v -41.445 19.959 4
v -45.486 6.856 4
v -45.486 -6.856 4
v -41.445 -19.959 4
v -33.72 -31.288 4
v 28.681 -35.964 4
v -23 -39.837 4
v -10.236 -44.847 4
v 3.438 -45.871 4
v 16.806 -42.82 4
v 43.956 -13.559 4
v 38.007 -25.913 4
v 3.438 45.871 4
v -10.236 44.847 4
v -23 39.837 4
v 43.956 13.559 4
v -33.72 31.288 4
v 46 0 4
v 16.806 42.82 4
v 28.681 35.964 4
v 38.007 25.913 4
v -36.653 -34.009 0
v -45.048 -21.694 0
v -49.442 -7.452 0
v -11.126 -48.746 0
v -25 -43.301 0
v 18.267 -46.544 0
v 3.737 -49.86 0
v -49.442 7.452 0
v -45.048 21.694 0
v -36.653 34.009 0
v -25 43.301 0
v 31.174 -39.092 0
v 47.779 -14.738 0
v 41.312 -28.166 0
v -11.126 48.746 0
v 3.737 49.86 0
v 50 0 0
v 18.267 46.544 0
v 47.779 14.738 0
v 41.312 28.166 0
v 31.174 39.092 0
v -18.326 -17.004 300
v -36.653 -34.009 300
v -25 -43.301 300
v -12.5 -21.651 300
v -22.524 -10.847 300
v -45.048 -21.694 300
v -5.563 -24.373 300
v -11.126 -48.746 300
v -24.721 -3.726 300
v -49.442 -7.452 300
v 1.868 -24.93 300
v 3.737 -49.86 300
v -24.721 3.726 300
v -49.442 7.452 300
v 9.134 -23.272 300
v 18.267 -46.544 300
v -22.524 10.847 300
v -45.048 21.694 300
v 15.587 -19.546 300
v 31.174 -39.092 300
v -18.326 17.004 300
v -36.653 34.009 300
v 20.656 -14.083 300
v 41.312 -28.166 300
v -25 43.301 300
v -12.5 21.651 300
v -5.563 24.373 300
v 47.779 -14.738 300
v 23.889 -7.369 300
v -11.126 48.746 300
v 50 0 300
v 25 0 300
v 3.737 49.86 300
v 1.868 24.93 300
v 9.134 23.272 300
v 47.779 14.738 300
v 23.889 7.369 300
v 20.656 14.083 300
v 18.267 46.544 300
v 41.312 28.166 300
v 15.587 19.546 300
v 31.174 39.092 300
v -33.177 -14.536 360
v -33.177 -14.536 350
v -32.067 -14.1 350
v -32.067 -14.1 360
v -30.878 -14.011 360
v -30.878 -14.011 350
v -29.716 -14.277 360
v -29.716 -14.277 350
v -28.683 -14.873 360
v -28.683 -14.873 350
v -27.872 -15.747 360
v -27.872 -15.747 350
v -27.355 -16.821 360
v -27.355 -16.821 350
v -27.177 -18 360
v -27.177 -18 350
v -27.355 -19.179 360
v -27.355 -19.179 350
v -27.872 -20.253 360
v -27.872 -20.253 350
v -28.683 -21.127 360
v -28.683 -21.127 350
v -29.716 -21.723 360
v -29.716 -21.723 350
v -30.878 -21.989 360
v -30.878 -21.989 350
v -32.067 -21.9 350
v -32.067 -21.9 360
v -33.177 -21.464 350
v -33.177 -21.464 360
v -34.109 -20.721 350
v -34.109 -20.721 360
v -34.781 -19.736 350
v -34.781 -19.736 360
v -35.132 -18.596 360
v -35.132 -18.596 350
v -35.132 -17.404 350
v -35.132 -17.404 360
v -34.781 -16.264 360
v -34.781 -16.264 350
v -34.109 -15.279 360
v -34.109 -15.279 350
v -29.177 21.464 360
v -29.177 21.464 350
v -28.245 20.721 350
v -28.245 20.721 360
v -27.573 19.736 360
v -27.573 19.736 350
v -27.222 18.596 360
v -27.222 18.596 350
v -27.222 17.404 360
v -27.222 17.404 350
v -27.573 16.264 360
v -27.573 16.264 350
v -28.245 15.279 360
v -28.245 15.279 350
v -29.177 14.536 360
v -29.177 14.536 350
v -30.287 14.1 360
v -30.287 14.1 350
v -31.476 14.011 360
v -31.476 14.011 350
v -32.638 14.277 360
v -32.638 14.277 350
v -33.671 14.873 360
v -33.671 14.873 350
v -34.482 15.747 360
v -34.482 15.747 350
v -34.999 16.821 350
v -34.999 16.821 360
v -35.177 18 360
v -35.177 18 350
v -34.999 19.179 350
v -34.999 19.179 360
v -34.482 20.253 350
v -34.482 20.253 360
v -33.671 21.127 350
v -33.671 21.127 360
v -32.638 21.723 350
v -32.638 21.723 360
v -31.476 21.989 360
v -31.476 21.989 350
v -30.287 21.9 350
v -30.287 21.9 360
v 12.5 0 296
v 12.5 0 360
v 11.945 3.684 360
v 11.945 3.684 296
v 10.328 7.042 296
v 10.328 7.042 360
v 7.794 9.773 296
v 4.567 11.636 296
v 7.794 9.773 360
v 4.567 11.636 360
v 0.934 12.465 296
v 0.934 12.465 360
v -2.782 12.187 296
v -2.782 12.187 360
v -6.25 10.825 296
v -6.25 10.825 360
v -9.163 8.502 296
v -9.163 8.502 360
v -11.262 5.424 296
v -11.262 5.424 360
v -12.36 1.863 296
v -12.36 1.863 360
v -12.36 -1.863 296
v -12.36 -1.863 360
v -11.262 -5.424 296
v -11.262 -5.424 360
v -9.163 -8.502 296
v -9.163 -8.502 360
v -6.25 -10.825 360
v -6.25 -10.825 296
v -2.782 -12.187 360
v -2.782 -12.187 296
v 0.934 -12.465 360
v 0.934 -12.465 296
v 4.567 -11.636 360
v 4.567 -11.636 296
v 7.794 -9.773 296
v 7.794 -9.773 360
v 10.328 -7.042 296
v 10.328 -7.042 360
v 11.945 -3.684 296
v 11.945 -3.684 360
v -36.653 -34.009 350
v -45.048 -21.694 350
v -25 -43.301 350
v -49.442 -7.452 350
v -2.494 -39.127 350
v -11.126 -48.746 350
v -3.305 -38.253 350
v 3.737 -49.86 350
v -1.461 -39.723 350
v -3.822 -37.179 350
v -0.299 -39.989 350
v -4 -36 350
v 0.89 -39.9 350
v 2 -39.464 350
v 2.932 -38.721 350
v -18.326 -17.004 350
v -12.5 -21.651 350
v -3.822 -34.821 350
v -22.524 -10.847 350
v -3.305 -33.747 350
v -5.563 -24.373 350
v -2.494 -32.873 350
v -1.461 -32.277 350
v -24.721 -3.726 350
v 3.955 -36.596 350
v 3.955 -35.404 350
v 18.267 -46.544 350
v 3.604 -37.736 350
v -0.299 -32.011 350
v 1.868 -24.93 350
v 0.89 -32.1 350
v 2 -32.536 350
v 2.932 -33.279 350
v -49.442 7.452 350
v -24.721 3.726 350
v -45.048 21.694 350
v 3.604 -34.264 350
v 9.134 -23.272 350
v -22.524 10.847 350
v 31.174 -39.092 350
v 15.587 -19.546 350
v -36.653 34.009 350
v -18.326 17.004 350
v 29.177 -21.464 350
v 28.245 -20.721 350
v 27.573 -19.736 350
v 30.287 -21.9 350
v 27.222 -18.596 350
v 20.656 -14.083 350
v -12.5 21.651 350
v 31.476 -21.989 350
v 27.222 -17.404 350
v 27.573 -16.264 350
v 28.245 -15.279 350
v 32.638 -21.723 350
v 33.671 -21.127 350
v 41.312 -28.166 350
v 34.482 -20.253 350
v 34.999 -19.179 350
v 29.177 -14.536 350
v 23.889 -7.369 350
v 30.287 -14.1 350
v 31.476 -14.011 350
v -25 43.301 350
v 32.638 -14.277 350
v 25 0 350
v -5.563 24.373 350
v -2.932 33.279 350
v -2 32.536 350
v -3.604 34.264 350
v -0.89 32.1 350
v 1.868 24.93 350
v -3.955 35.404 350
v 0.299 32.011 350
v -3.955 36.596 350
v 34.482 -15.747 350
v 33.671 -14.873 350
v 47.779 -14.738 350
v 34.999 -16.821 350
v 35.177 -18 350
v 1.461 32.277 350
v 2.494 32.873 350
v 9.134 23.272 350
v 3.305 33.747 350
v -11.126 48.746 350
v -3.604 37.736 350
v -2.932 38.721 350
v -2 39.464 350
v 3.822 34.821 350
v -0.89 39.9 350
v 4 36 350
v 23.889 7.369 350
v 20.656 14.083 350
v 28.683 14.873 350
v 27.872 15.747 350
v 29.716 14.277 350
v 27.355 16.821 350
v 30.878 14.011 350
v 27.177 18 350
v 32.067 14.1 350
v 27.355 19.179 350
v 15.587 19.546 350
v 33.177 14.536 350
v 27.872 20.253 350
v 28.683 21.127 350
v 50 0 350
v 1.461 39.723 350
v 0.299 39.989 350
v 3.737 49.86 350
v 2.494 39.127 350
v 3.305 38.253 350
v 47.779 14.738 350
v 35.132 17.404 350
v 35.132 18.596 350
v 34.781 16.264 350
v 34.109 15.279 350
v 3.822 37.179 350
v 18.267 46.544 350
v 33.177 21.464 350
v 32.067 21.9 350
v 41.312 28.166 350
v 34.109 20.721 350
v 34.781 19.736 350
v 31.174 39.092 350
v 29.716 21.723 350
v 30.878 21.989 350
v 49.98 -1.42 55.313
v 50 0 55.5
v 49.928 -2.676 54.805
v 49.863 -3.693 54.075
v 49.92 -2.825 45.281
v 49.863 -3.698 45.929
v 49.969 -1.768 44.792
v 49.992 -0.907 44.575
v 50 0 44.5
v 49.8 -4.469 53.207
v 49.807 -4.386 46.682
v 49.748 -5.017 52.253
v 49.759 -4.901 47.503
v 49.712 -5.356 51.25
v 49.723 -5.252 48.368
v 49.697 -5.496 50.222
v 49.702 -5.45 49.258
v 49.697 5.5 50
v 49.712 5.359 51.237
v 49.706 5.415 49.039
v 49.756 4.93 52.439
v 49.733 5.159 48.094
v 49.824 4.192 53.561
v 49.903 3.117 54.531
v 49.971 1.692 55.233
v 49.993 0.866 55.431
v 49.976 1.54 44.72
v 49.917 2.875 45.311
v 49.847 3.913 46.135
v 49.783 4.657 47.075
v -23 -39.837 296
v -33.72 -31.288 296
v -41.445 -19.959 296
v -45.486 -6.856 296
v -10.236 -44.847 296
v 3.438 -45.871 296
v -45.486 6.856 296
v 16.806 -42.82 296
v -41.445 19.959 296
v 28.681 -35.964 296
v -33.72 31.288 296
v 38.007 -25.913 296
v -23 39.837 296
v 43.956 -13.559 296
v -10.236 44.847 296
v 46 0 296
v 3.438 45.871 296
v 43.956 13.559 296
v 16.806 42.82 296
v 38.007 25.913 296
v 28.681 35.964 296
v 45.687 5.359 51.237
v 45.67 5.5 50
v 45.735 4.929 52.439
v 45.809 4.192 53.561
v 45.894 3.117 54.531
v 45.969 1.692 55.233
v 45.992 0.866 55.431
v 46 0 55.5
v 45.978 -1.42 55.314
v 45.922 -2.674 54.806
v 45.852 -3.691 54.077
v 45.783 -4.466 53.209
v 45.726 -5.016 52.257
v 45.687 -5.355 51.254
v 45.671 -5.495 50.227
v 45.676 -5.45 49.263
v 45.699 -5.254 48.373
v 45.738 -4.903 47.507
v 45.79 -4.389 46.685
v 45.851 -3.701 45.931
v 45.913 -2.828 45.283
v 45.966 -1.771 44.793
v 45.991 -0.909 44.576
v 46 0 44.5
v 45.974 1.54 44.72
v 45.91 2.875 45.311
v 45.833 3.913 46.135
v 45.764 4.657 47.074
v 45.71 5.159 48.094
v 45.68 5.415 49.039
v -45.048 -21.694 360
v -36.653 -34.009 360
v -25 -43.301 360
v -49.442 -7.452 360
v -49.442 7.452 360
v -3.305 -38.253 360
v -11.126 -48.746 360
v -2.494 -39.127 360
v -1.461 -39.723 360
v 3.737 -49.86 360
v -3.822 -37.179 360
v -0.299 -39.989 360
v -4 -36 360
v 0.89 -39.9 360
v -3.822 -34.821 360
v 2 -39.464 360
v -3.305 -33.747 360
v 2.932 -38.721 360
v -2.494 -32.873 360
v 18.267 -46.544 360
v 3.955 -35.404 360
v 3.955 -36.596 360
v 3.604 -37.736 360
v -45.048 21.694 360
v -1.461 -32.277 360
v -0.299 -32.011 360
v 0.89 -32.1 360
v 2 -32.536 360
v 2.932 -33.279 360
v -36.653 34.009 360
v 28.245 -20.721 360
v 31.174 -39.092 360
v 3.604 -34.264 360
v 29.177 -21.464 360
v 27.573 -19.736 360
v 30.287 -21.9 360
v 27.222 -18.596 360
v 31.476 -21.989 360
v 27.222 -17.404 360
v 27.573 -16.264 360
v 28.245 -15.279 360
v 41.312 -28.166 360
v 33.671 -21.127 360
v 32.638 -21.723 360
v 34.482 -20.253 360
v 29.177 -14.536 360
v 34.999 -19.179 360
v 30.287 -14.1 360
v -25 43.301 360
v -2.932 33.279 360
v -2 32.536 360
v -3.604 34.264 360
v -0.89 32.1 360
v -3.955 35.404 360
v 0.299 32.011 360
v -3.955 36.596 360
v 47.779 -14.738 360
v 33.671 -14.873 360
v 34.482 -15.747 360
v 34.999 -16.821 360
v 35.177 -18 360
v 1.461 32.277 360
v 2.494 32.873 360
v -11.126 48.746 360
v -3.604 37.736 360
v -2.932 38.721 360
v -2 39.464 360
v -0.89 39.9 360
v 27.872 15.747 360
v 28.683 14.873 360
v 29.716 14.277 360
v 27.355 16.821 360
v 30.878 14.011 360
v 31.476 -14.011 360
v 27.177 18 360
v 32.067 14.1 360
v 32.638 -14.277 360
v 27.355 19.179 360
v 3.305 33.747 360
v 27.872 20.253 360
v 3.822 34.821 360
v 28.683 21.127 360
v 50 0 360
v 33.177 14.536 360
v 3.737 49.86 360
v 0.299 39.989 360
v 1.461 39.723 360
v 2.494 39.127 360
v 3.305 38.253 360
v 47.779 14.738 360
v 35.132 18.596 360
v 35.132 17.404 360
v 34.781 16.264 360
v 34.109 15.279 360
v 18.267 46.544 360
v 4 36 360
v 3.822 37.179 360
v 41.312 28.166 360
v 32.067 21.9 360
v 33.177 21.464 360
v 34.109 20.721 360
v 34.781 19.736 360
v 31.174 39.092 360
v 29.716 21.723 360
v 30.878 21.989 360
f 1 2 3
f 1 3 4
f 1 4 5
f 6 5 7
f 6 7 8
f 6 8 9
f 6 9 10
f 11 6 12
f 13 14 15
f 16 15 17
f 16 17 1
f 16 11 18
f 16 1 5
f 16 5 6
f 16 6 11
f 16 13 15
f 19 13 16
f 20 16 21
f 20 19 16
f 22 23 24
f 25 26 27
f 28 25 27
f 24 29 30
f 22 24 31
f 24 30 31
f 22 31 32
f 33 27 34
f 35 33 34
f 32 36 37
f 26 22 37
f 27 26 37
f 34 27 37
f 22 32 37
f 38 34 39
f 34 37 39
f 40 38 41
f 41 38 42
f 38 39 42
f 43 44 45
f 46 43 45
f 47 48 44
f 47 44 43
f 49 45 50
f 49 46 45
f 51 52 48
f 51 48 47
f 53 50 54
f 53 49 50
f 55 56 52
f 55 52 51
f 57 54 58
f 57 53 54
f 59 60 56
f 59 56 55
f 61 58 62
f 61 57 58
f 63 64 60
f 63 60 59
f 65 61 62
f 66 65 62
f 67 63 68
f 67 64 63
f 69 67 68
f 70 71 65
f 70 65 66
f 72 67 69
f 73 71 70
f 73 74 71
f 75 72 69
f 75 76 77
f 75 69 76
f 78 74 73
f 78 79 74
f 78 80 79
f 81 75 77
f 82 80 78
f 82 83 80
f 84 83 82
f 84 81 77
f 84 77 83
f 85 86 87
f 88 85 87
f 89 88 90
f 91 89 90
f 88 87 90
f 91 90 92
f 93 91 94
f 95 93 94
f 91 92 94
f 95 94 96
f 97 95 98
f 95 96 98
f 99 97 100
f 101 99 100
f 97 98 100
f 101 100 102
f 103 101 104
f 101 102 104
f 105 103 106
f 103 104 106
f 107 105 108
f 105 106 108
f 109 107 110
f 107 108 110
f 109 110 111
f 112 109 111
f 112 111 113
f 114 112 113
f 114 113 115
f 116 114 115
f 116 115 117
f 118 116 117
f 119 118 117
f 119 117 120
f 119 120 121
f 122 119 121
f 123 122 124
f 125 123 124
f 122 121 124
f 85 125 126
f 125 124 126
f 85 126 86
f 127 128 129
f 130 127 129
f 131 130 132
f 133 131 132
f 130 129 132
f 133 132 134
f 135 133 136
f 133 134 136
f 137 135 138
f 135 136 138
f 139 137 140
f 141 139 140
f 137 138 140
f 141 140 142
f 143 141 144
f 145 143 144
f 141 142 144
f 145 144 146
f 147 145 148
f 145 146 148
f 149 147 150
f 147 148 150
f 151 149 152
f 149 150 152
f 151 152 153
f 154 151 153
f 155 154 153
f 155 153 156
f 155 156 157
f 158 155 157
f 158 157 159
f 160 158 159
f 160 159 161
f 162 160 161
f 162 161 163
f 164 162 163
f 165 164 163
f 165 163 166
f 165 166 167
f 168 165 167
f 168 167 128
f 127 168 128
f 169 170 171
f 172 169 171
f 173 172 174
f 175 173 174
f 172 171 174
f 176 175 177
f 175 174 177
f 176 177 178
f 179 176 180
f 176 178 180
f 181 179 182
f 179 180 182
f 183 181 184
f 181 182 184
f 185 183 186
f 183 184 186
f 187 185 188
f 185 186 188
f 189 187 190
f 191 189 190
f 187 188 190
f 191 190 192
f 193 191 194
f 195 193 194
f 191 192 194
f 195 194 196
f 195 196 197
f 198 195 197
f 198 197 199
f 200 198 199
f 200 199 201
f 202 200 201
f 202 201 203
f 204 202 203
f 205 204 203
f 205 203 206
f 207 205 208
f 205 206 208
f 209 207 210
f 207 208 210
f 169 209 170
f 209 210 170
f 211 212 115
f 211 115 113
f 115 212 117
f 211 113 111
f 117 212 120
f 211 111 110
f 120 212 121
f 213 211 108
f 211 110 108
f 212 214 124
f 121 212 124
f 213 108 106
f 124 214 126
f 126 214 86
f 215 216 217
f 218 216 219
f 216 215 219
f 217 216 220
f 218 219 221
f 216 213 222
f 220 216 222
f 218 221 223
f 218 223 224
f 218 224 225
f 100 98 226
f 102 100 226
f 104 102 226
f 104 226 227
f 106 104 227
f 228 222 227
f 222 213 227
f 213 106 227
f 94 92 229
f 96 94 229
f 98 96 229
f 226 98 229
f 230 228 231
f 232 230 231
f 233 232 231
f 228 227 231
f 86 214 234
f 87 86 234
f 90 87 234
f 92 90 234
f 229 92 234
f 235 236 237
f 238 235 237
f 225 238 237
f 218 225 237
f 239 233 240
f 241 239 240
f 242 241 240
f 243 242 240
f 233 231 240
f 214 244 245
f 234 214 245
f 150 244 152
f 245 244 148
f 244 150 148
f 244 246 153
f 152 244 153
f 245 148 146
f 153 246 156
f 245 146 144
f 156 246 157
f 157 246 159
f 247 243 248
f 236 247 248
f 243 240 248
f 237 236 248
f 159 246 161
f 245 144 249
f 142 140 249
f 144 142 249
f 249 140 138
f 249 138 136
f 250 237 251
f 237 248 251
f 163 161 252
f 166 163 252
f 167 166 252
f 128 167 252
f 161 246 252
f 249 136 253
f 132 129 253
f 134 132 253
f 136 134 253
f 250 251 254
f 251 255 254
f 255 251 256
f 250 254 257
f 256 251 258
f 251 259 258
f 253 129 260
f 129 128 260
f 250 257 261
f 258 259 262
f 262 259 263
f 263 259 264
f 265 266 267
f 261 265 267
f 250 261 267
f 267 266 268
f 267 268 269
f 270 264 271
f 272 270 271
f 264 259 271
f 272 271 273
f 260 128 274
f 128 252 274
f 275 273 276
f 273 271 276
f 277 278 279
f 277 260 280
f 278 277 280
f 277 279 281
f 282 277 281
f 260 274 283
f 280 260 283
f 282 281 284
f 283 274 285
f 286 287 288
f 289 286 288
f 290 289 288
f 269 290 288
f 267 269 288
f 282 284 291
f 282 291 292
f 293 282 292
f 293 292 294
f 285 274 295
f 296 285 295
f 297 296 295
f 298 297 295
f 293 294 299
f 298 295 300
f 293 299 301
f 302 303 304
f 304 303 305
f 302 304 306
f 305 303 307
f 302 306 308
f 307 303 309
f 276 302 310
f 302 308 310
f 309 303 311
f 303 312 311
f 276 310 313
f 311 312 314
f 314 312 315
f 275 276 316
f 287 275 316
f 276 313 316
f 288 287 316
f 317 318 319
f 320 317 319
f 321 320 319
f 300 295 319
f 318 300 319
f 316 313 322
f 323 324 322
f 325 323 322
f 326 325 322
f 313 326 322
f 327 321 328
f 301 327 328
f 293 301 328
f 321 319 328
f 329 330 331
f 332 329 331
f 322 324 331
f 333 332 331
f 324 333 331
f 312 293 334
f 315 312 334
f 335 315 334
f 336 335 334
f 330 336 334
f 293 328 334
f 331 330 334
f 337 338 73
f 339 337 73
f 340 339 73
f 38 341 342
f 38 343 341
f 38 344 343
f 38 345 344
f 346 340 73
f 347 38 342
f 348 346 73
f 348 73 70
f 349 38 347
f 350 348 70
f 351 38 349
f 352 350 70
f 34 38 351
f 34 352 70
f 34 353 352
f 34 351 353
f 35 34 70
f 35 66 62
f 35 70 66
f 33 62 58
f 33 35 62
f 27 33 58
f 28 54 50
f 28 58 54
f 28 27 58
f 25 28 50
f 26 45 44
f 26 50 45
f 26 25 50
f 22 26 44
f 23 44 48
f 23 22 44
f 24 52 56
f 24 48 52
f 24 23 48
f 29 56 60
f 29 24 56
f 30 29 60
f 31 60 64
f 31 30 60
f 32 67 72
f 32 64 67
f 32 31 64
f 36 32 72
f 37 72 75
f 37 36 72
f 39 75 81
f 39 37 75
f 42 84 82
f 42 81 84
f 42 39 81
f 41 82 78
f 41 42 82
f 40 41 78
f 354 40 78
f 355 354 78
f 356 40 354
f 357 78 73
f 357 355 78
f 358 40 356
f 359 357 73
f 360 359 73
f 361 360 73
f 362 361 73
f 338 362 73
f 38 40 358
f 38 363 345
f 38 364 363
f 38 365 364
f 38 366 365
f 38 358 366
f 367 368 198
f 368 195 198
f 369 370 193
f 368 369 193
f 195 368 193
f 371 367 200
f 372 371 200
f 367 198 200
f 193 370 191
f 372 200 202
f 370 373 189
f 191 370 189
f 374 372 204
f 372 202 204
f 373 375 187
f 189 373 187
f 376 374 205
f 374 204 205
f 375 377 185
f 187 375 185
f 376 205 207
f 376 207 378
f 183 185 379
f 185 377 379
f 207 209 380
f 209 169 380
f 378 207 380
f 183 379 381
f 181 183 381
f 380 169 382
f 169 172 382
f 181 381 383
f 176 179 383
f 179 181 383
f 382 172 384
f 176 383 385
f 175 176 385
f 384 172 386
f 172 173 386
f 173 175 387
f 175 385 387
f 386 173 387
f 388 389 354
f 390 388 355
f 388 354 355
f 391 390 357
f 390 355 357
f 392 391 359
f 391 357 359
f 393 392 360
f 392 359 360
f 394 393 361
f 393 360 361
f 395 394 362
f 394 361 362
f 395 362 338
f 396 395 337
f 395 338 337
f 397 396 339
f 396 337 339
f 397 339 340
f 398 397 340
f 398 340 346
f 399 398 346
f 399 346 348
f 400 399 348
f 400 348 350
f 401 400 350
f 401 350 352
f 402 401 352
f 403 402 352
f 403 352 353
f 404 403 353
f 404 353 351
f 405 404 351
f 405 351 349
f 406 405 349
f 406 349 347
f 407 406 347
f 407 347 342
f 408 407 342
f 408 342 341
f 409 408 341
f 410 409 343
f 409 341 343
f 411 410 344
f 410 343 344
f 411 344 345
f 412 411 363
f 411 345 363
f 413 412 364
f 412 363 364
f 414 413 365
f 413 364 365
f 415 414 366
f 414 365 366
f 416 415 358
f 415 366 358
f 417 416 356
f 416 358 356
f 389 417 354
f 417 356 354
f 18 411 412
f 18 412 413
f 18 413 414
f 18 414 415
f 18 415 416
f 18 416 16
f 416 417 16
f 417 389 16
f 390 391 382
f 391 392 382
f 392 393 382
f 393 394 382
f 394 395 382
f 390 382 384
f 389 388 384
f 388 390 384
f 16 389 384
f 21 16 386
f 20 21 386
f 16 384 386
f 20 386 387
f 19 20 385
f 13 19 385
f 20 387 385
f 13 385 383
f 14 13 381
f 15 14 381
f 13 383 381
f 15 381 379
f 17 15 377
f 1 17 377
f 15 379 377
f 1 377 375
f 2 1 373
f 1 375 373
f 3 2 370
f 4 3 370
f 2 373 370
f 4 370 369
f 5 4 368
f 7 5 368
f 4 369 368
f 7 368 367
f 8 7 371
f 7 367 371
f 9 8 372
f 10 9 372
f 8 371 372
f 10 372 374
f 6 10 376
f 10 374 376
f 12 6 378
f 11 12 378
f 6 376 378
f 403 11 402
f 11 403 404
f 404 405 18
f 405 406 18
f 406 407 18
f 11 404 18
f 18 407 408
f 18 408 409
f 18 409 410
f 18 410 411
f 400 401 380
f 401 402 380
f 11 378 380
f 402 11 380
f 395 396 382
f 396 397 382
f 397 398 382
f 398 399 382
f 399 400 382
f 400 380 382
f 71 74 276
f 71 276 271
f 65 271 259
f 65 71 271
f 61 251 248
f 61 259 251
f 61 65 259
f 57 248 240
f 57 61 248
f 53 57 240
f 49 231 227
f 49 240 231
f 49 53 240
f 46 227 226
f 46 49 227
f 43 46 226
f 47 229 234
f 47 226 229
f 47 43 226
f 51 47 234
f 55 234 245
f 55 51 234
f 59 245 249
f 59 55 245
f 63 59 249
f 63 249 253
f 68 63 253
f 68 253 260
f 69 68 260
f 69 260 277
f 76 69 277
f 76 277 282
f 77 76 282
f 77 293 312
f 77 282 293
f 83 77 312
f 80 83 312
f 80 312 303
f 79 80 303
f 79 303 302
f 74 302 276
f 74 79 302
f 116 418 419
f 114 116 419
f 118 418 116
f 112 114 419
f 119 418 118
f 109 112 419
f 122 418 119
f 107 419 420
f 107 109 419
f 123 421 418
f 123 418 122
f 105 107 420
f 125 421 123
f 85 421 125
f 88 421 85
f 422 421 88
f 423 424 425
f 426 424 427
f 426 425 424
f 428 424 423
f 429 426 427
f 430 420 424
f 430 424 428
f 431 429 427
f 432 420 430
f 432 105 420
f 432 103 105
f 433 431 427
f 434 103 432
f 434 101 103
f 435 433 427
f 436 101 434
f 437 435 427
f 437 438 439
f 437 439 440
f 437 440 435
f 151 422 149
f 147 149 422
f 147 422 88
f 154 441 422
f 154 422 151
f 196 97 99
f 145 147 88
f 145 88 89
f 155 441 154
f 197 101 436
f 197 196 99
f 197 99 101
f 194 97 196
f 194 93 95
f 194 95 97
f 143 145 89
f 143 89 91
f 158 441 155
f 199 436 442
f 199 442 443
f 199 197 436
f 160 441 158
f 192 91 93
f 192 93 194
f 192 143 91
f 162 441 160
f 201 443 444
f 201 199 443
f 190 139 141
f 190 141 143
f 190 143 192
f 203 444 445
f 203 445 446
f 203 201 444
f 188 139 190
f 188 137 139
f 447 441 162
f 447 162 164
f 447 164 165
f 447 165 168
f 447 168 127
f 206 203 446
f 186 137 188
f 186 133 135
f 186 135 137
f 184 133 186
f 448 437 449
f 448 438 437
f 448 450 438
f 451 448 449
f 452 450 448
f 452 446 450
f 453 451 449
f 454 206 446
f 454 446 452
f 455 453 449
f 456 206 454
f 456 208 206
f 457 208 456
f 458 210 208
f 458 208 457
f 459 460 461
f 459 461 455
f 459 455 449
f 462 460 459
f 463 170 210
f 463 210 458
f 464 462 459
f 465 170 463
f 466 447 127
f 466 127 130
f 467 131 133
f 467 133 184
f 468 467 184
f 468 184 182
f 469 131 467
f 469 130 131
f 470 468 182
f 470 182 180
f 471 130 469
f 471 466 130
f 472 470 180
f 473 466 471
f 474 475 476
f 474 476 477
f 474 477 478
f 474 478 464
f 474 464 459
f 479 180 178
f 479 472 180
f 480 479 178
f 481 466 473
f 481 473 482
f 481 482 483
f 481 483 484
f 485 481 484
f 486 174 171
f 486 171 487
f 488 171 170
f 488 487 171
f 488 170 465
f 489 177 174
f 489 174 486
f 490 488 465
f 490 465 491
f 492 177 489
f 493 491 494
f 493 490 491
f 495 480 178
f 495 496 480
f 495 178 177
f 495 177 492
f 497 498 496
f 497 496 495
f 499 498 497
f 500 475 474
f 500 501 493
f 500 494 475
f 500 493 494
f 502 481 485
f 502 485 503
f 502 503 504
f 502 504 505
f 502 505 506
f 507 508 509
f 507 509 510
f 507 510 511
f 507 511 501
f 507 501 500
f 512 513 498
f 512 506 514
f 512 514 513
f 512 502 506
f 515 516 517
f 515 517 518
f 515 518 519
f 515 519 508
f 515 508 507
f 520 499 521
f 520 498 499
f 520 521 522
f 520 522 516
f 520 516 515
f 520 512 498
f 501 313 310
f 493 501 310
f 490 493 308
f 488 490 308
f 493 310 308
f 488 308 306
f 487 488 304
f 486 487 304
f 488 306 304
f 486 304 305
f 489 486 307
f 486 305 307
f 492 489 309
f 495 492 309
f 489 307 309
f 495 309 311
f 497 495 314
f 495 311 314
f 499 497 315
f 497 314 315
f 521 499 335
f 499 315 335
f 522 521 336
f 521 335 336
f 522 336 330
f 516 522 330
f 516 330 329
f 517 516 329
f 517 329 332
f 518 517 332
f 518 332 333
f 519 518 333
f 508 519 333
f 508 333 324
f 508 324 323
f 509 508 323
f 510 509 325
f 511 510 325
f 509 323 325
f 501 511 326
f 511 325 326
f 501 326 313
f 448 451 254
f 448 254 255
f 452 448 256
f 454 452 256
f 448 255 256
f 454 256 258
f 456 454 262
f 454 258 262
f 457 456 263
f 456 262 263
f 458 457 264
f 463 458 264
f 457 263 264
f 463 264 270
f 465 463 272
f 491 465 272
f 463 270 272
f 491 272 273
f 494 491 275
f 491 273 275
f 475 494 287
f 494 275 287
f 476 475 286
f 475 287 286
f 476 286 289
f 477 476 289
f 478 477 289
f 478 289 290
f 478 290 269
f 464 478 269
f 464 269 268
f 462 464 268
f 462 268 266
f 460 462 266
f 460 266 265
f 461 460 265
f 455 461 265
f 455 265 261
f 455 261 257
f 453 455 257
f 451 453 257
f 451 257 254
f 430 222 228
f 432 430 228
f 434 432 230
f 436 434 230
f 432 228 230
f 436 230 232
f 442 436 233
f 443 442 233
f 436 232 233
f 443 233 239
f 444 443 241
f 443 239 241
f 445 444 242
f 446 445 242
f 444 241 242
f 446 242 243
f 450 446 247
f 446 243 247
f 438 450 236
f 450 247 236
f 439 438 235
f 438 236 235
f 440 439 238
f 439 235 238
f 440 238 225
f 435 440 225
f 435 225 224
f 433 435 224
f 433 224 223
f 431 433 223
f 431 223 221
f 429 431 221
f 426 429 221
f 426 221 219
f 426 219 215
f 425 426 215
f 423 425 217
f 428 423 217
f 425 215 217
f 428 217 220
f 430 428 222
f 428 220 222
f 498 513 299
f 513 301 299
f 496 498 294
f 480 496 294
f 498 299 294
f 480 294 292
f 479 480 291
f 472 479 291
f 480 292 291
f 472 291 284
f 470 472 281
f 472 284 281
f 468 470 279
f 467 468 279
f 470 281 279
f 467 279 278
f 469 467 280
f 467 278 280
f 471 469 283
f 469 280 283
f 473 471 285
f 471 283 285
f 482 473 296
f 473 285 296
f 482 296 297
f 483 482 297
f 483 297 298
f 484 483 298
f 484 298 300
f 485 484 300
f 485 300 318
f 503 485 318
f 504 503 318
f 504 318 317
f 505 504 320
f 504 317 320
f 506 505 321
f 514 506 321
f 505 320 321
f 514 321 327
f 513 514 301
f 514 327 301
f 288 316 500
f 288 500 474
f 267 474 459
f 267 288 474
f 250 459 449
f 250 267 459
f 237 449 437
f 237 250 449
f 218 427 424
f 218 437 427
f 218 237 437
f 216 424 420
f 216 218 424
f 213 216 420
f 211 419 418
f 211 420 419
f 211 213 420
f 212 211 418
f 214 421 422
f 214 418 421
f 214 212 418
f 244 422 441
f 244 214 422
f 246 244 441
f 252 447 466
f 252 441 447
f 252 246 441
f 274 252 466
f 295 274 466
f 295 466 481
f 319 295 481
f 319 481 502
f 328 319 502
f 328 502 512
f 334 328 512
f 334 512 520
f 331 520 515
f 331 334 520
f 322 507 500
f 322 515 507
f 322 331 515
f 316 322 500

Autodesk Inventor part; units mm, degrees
ref_plane "XZ Plane" through (0, 0, 0) normal (0, 1, 0) x (-1, 0, 0)
ref_plane "XY Plane" through (0, 0, 0) normal (0, 0, 1) x (1, 0, 0)
sketch "Sketch1" plane through (0, 0, 0) normal (0, 0, 1) x (1, 0, 0)
  circle A0 centre (0, 0) radius 50
  dimension "d0" = 100
extrude "Extrusion1" add sketch "Sketch1" along normal blind 300
sketch "Sketch2" plane through (0, 0, 300) normal (0, 0, 1) x (1, 0, 0)
  circle A0 centre (0, 0) radius 50 projected
  circle A1 centre (0, 0) radius 46
  dimension "d3" = 92
extrude "Extrusion2" cut sketch "Sketch2" against normal blind 296 contours A1
sketch "Sketch3" plane through (0, 0, 300) normal (0, 0, 1) x (1, 0, 0)
  circle A0 centre (0, 0) radius 46
extrude "Extrusion3" add sketch "Sketch3" against normal blind 4
sketch "Sketch4" plane through (0, 0, 300) normal (0, 0, 1) x (1, 0, 0)
  circle A0 centre (0, 0) radius 25
  dimension "d8" = 50
extrude "Extrusion4" add sketch "Sketch4" along normal blind 50
sketch "Sketch5" plane through (0, 0, 350) normal (0, 0, 1) x (1, 0, 0)
  circle A0 centre (0, 0) radius 12.5
  dimension "d11" = 25
extrude "Extrusion5" cut sketch "Sketch5" against normal blind 100
sketch "Sketch6" plane through (0, 0, 350) normal (0, 0, 1) x (1, 0, 0)
  circle A0 centre (0, 0) radius 50
extrude "Extrusion6" add sketch "Sketch6" along normal blind 10
sketch "Sketch7" plane through (0, 0, 360) normal (0, 0, 1) x (1, 0, 0)
  circle A0 centre (0, 0) radius 12.5 projected
  circle A1 centre (0, 0) radius 12.5
extrude "Extrusion7" cut sketch "Sketch7" against normal blind 300
sketch "Sketch8" plane through (0, 0, 360) normal (0, 0, 1) x (1, 0, 0)
  line L0 (0, 0) -> (0, -36)
  line L1 (0, 0) -> (0, 36)
  line L2 (0, 0) -> (36, 0)
  line L3 (0, 0) -> (-36, 0)
  circle A0 centre (0, 0) radius 12.5 projected
  line L4 (0, 0) -> (0, 36)
  circle A1 centre (0, 36) radius 4
  dimension "d31" = 8
ref_plane "Work Plane1" through (50, 0, 0) normal (1, 0, 0) x (0, 1, 0)
extrude "Extrusion9" cut sketch "Sketch8" along normal mid plane 25 contours A1
sketch "Sketch11" plane through (0, 0, 360) normal (0, 0, 1) x (1, 0, 0)
  point P0 (0, 0)
pattern_circular "Circular Pattern1" count 6 over 360 about axis through (0, 0, 350) along (0, 0, -1) of "Extrusion9"
sketch "Sketch12" plane through (50, 0, 0) normal (1, 0, 0) x (0, 1, 0)
  line L0 (0, 0) -> (0, 50)
  circle A0 centre (0, 50) radius 5.5
  dimension "d37" = 50
  dimension "d39" = 11
extrude "Extrusion10" cut sketch "Sketch12" against normal blind 50
properties part number "again"
